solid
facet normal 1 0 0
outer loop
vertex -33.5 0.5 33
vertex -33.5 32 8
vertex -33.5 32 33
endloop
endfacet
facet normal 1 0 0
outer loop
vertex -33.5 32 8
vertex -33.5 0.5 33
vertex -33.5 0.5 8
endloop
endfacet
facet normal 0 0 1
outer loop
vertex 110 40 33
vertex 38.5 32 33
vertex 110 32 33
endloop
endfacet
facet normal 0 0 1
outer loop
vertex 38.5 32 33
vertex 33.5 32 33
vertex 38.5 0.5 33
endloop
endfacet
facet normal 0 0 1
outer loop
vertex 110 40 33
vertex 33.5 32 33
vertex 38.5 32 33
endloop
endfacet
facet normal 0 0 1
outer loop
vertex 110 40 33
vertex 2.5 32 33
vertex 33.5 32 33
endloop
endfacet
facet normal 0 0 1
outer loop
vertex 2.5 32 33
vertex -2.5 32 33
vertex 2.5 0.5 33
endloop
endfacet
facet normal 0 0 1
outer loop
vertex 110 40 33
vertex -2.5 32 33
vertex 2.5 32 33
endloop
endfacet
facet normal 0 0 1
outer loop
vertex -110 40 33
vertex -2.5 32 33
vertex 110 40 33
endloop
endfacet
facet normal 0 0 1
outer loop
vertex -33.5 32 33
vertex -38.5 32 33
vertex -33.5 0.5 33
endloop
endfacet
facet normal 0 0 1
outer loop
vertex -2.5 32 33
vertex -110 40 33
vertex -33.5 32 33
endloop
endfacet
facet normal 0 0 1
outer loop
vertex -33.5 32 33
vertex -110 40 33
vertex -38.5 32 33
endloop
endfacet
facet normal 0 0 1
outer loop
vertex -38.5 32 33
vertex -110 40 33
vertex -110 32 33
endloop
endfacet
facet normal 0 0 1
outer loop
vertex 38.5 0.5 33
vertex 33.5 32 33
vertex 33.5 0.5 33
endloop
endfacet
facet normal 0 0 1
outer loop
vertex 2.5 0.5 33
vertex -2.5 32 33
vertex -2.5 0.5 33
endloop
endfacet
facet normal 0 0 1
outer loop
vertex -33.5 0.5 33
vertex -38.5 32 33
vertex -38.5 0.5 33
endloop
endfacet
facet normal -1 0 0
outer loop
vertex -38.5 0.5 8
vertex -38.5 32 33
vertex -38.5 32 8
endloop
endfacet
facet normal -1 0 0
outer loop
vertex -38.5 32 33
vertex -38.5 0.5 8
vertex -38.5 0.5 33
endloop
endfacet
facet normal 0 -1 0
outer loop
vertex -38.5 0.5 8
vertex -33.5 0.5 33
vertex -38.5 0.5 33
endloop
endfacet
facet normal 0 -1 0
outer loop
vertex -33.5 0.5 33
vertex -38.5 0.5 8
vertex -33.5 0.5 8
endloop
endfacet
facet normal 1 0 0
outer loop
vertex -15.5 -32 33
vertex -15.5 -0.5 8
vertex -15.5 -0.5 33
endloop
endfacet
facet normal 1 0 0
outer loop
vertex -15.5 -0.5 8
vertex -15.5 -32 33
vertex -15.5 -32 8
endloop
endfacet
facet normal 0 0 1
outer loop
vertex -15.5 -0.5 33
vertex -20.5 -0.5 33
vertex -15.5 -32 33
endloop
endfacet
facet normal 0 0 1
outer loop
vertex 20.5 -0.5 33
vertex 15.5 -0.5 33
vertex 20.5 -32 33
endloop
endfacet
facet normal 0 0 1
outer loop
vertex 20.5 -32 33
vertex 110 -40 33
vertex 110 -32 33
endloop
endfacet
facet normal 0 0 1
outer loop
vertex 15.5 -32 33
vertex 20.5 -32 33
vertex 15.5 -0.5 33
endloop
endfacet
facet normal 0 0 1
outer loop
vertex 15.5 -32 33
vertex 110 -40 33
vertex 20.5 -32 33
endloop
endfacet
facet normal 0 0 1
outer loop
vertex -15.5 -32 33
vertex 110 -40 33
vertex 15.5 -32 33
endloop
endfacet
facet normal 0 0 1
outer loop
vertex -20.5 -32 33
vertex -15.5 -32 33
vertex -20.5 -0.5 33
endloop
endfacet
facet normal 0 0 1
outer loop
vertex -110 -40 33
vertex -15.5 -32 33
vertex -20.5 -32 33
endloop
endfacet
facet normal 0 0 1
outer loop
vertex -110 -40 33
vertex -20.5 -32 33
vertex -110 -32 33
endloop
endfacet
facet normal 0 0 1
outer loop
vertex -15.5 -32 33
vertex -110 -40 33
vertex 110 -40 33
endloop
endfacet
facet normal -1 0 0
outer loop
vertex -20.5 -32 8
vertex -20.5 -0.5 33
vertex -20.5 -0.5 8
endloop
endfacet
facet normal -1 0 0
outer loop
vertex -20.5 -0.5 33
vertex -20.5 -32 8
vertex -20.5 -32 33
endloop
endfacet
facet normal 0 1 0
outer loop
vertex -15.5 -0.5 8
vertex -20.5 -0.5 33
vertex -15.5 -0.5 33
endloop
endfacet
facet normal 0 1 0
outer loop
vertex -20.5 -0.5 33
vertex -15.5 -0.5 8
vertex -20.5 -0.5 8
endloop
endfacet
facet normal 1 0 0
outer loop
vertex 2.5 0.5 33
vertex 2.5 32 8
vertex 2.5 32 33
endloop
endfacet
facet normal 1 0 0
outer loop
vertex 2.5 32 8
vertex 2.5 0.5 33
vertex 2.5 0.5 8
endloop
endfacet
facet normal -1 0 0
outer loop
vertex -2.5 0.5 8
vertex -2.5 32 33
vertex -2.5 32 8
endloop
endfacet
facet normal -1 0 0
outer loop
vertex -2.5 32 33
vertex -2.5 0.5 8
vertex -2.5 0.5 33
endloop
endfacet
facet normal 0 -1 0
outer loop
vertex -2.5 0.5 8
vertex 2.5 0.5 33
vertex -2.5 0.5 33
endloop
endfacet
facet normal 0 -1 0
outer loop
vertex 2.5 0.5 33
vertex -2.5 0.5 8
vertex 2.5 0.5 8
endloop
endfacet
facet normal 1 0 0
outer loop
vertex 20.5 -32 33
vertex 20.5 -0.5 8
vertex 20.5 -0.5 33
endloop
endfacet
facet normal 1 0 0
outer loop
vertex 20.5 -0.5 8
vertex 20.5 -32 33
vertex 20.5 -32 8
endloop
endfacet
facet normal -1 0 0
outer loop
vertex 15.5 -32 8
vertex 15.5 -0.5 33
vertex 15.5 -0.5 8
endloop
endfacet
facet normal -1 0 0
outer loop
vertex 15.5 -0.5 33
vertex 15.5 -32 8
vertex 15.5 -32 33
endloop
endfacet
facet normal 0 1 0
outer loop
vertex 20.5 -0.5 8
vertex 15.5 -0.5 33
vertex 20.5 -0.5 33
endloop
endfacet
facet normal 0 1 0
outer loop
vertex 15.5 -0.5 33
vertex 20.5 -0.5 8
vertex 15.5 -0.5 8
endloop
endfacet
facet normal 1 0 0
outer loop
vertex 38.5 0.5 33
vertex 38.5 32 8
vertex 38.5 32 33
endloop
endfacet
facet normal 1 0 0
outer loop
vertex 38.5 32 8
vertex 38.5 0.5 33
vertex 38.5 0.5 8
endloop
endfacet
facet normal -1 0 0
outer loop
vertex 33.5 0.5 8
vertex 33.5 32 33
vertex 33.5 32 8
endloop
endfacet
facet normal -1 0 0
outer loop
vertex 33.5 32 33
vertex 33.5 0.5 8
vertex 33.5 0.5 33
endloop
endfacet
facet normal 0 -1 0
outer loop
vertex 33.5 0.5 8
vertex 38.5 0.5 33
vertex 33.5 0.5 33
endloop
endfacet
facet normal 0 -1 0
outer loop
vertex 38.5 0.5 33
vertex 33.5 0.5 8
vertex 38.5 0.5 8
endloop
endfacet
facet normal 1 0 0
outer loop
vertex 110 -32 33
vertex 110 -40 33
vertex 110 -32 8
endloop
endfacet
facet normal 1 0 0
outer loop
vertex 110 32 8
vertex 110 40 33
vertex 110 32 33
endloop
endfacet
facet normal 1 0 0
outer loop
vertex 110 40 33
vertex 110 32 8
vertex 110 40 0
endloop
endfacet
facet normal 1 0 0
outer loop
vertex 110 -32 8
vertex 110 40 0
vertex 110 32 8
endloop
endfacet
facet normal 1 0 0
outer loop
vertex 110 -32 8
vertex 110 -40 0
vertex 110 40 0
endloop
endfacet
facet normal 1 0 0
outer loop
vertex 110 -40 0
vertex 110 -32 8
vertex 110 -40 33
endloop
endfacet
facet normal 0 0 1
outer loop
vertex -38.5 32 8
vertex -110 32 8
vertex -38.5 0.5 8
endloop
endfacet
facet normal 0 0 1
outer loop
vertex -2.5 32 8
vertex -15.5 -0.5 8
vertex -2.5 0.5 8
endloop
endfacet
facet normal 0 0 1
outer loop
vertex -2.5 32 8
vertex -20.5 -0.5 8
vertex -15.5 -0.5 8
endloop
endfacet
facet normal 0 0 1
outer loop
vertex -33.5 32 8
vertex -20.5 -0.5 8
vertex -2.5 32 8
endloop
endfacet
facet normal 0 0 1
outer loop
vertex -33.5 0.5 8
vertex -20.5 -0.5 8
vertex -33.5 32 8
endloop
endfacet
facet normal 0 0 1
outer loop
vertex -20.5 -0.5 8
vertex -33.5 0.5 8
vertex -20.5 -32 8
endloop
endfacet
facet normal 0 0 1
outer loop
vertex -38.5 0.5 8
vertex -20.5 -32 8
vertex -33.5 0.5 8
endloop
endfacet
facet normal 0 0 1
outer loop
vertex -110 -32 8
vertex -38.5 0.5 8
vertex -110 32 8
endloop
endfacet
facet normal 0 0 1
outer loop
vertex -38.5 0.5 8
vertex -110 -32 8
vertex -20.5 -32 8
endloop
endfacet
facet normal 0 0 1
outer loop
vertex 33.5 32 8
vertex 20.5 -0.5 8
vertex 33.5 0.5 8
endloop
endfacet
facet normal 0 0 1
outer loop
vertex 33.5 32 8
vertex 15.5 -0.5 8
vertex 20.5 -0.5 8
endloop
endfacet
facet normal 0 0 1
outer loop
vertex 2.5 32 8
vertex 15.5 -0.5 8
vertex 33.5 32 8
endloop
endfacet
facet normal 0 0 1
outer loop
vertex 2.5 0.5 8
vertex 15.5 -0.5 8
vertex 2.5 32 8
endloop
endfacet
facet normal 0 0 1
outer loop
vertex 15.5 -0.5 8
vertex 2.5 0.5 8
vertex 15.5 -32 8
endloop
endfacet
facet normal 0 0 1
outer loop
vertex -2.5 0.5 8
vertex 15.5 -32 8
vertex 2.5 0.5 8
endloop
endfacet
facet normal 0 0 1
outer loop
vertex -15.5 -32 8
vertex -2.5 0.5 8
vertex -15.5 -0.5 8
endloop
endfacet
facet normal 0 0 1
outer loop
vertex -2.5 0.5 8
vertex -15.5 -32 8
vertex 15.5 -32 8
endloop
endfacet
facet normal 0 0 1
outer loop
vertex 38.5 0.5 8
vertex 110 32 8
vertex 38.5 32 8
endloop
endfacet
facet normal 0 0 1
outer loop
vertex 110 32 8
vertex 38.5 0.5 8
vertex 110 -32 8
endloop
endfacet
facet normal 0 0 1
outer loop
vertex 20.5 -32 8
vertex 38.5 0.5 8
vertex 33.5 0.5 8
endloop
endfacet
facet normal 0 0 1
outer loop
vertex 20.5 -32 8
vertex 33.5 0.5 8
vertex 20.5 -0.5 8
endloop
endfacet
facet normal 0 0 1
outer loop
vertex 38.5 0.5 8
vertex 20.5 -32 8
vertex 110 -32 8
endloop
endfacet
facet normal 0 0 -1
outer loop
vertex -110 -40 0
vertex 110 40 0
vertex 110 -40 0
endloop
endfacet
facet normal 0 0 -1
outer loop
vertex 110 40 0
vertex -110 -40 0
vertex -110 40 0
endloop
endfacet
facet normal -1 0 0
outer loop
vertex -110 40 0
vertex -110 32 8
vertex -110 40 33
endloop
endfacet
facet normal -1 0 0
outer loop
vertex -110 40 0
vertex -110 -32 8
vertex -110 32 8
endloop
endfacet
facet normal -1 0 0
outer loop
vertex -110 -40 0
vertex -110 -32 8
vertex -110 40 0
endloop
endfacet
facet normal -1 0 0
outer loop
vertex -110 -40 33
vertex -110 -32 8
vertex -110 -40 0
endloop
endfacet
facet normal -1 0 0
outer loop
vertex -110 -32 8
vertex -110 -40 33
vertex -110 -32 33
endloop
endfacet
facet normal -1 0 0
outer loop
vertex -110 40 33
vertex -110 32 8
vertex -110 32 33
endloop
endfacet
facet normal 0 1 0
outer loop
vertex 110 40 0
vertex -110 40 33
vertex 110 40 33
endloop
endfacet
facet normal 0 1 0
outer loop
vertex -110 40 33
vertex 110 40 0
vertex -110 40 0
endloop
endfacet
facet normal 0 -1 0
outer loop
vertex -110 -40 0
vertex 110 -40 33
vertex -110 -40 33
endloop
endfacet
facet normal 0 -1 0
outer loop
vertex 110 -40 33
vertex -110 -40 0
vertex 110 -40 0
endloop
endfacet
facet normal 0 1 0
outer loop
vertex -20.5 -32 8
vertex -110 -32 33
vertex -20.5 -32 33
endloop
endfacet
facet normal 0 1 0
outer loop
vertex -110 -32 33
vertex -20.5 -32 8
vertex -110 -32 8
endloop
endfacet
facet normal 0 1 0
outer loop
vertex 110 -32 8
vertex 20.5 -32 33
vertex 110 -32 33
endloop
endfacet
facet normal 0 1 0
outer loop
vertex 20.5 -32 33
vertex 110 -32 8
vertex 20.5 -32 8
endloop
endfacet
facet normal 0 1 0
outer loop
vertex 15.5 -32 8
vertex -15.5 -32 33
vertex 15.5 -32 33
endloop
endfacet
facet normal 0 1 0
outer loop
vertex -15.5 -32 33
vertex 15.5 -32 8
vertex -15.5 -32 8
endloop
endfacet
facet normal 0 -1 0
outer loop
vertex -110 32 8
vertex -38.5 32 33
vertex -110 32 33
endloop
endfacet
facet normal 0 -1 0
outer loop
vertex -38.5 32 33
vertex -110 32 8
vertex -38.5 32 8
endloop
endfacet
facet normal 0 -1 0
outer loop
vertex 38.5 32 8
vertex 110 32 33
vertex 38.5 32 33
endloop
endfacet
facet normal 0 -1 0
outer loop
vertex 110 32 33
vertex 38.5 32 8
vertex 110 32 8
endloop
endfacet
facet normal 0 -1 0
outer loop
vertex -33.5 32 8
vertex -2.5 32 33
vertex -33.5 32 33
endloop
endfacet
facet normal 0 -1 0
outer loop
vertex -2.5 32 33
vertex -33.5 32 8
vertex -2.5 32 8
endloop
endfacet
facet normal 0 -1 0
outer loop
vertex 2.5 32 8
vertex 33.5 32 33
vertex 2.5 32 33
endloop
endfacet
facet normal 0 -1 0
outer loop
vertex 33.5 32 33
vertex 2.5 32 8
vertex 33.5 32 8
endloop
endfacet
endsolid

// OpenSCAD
$fn = 32;

// ----------------------------------------------------------------------
// Rib frame 220 x 80 x 33
// 5 ribs at 18 mm pitch, staggered
// ----------------------------------------------------------------------

// --- parameters (mm) ---
frame = [220, 80, 8];  // base plate size (x, y, z)
seat_tol = 0.15;       // tolerance at the seating features
free_tol = 0.5;        // general tolerance on the free sizes
rail_w = 8;            // side rail width
ribs = 5;              // number of ribs
rib_t = 5;             // rib thickness
rib_h = 25;            // rib height above the base plate
pitch = 18;            // pitch between rib centres

// --- derived feature positions (mm) ---
span = (ribs - 1) * pitch;          // = 72   distance between the outer ribs
origin_x = -span / 2;               // = -36   X of the first rib
rib_len = frame[1] / 2 - rail_w + 0.5;  // = 32.5   length of a staggered rib
rib_y = 0.5 + rib_len / 2;          // = 16.75   Y of a staggered rib centre
row_offset = 2 * rib_y;             // = 33.5   distance between the two rows
feature_centers = [
  [origin_x + 0 * pitch, rib_y],
  [origin_x + 1 * pitch, -rib_y],
  [origin_x + 2 * pitch, rib_y],
  [origin_x + 3 * pitch, -rib_y],
  [origin_x + 4 * pitch, rib_y]
];   // rib centre line, drives the rib loop

// base plate, two side rails, then the ribs read straight off feature_centers
union() {
  translate([-frame[0] / 2, -frame[1] / 2, 0]) cube(frame);
  translate([-frame[0] / 2, -frame[1] / 2, 0]) cube([frame[0], rail_w, frame[2] + rib_h]);
  translate([-frame[0] / 2, frame[1] / 2 - rail_w, 0]) cube([frame[0], rail_w, frame[2] + rib_h]);
  for (centre = feature_centers)
    translate([centre[0] - rib_t / 2, centre[1] - rib_len / 2, frame[2] - 1])
      cube([rib_t, rib_len, rib_h + 1]);
}
